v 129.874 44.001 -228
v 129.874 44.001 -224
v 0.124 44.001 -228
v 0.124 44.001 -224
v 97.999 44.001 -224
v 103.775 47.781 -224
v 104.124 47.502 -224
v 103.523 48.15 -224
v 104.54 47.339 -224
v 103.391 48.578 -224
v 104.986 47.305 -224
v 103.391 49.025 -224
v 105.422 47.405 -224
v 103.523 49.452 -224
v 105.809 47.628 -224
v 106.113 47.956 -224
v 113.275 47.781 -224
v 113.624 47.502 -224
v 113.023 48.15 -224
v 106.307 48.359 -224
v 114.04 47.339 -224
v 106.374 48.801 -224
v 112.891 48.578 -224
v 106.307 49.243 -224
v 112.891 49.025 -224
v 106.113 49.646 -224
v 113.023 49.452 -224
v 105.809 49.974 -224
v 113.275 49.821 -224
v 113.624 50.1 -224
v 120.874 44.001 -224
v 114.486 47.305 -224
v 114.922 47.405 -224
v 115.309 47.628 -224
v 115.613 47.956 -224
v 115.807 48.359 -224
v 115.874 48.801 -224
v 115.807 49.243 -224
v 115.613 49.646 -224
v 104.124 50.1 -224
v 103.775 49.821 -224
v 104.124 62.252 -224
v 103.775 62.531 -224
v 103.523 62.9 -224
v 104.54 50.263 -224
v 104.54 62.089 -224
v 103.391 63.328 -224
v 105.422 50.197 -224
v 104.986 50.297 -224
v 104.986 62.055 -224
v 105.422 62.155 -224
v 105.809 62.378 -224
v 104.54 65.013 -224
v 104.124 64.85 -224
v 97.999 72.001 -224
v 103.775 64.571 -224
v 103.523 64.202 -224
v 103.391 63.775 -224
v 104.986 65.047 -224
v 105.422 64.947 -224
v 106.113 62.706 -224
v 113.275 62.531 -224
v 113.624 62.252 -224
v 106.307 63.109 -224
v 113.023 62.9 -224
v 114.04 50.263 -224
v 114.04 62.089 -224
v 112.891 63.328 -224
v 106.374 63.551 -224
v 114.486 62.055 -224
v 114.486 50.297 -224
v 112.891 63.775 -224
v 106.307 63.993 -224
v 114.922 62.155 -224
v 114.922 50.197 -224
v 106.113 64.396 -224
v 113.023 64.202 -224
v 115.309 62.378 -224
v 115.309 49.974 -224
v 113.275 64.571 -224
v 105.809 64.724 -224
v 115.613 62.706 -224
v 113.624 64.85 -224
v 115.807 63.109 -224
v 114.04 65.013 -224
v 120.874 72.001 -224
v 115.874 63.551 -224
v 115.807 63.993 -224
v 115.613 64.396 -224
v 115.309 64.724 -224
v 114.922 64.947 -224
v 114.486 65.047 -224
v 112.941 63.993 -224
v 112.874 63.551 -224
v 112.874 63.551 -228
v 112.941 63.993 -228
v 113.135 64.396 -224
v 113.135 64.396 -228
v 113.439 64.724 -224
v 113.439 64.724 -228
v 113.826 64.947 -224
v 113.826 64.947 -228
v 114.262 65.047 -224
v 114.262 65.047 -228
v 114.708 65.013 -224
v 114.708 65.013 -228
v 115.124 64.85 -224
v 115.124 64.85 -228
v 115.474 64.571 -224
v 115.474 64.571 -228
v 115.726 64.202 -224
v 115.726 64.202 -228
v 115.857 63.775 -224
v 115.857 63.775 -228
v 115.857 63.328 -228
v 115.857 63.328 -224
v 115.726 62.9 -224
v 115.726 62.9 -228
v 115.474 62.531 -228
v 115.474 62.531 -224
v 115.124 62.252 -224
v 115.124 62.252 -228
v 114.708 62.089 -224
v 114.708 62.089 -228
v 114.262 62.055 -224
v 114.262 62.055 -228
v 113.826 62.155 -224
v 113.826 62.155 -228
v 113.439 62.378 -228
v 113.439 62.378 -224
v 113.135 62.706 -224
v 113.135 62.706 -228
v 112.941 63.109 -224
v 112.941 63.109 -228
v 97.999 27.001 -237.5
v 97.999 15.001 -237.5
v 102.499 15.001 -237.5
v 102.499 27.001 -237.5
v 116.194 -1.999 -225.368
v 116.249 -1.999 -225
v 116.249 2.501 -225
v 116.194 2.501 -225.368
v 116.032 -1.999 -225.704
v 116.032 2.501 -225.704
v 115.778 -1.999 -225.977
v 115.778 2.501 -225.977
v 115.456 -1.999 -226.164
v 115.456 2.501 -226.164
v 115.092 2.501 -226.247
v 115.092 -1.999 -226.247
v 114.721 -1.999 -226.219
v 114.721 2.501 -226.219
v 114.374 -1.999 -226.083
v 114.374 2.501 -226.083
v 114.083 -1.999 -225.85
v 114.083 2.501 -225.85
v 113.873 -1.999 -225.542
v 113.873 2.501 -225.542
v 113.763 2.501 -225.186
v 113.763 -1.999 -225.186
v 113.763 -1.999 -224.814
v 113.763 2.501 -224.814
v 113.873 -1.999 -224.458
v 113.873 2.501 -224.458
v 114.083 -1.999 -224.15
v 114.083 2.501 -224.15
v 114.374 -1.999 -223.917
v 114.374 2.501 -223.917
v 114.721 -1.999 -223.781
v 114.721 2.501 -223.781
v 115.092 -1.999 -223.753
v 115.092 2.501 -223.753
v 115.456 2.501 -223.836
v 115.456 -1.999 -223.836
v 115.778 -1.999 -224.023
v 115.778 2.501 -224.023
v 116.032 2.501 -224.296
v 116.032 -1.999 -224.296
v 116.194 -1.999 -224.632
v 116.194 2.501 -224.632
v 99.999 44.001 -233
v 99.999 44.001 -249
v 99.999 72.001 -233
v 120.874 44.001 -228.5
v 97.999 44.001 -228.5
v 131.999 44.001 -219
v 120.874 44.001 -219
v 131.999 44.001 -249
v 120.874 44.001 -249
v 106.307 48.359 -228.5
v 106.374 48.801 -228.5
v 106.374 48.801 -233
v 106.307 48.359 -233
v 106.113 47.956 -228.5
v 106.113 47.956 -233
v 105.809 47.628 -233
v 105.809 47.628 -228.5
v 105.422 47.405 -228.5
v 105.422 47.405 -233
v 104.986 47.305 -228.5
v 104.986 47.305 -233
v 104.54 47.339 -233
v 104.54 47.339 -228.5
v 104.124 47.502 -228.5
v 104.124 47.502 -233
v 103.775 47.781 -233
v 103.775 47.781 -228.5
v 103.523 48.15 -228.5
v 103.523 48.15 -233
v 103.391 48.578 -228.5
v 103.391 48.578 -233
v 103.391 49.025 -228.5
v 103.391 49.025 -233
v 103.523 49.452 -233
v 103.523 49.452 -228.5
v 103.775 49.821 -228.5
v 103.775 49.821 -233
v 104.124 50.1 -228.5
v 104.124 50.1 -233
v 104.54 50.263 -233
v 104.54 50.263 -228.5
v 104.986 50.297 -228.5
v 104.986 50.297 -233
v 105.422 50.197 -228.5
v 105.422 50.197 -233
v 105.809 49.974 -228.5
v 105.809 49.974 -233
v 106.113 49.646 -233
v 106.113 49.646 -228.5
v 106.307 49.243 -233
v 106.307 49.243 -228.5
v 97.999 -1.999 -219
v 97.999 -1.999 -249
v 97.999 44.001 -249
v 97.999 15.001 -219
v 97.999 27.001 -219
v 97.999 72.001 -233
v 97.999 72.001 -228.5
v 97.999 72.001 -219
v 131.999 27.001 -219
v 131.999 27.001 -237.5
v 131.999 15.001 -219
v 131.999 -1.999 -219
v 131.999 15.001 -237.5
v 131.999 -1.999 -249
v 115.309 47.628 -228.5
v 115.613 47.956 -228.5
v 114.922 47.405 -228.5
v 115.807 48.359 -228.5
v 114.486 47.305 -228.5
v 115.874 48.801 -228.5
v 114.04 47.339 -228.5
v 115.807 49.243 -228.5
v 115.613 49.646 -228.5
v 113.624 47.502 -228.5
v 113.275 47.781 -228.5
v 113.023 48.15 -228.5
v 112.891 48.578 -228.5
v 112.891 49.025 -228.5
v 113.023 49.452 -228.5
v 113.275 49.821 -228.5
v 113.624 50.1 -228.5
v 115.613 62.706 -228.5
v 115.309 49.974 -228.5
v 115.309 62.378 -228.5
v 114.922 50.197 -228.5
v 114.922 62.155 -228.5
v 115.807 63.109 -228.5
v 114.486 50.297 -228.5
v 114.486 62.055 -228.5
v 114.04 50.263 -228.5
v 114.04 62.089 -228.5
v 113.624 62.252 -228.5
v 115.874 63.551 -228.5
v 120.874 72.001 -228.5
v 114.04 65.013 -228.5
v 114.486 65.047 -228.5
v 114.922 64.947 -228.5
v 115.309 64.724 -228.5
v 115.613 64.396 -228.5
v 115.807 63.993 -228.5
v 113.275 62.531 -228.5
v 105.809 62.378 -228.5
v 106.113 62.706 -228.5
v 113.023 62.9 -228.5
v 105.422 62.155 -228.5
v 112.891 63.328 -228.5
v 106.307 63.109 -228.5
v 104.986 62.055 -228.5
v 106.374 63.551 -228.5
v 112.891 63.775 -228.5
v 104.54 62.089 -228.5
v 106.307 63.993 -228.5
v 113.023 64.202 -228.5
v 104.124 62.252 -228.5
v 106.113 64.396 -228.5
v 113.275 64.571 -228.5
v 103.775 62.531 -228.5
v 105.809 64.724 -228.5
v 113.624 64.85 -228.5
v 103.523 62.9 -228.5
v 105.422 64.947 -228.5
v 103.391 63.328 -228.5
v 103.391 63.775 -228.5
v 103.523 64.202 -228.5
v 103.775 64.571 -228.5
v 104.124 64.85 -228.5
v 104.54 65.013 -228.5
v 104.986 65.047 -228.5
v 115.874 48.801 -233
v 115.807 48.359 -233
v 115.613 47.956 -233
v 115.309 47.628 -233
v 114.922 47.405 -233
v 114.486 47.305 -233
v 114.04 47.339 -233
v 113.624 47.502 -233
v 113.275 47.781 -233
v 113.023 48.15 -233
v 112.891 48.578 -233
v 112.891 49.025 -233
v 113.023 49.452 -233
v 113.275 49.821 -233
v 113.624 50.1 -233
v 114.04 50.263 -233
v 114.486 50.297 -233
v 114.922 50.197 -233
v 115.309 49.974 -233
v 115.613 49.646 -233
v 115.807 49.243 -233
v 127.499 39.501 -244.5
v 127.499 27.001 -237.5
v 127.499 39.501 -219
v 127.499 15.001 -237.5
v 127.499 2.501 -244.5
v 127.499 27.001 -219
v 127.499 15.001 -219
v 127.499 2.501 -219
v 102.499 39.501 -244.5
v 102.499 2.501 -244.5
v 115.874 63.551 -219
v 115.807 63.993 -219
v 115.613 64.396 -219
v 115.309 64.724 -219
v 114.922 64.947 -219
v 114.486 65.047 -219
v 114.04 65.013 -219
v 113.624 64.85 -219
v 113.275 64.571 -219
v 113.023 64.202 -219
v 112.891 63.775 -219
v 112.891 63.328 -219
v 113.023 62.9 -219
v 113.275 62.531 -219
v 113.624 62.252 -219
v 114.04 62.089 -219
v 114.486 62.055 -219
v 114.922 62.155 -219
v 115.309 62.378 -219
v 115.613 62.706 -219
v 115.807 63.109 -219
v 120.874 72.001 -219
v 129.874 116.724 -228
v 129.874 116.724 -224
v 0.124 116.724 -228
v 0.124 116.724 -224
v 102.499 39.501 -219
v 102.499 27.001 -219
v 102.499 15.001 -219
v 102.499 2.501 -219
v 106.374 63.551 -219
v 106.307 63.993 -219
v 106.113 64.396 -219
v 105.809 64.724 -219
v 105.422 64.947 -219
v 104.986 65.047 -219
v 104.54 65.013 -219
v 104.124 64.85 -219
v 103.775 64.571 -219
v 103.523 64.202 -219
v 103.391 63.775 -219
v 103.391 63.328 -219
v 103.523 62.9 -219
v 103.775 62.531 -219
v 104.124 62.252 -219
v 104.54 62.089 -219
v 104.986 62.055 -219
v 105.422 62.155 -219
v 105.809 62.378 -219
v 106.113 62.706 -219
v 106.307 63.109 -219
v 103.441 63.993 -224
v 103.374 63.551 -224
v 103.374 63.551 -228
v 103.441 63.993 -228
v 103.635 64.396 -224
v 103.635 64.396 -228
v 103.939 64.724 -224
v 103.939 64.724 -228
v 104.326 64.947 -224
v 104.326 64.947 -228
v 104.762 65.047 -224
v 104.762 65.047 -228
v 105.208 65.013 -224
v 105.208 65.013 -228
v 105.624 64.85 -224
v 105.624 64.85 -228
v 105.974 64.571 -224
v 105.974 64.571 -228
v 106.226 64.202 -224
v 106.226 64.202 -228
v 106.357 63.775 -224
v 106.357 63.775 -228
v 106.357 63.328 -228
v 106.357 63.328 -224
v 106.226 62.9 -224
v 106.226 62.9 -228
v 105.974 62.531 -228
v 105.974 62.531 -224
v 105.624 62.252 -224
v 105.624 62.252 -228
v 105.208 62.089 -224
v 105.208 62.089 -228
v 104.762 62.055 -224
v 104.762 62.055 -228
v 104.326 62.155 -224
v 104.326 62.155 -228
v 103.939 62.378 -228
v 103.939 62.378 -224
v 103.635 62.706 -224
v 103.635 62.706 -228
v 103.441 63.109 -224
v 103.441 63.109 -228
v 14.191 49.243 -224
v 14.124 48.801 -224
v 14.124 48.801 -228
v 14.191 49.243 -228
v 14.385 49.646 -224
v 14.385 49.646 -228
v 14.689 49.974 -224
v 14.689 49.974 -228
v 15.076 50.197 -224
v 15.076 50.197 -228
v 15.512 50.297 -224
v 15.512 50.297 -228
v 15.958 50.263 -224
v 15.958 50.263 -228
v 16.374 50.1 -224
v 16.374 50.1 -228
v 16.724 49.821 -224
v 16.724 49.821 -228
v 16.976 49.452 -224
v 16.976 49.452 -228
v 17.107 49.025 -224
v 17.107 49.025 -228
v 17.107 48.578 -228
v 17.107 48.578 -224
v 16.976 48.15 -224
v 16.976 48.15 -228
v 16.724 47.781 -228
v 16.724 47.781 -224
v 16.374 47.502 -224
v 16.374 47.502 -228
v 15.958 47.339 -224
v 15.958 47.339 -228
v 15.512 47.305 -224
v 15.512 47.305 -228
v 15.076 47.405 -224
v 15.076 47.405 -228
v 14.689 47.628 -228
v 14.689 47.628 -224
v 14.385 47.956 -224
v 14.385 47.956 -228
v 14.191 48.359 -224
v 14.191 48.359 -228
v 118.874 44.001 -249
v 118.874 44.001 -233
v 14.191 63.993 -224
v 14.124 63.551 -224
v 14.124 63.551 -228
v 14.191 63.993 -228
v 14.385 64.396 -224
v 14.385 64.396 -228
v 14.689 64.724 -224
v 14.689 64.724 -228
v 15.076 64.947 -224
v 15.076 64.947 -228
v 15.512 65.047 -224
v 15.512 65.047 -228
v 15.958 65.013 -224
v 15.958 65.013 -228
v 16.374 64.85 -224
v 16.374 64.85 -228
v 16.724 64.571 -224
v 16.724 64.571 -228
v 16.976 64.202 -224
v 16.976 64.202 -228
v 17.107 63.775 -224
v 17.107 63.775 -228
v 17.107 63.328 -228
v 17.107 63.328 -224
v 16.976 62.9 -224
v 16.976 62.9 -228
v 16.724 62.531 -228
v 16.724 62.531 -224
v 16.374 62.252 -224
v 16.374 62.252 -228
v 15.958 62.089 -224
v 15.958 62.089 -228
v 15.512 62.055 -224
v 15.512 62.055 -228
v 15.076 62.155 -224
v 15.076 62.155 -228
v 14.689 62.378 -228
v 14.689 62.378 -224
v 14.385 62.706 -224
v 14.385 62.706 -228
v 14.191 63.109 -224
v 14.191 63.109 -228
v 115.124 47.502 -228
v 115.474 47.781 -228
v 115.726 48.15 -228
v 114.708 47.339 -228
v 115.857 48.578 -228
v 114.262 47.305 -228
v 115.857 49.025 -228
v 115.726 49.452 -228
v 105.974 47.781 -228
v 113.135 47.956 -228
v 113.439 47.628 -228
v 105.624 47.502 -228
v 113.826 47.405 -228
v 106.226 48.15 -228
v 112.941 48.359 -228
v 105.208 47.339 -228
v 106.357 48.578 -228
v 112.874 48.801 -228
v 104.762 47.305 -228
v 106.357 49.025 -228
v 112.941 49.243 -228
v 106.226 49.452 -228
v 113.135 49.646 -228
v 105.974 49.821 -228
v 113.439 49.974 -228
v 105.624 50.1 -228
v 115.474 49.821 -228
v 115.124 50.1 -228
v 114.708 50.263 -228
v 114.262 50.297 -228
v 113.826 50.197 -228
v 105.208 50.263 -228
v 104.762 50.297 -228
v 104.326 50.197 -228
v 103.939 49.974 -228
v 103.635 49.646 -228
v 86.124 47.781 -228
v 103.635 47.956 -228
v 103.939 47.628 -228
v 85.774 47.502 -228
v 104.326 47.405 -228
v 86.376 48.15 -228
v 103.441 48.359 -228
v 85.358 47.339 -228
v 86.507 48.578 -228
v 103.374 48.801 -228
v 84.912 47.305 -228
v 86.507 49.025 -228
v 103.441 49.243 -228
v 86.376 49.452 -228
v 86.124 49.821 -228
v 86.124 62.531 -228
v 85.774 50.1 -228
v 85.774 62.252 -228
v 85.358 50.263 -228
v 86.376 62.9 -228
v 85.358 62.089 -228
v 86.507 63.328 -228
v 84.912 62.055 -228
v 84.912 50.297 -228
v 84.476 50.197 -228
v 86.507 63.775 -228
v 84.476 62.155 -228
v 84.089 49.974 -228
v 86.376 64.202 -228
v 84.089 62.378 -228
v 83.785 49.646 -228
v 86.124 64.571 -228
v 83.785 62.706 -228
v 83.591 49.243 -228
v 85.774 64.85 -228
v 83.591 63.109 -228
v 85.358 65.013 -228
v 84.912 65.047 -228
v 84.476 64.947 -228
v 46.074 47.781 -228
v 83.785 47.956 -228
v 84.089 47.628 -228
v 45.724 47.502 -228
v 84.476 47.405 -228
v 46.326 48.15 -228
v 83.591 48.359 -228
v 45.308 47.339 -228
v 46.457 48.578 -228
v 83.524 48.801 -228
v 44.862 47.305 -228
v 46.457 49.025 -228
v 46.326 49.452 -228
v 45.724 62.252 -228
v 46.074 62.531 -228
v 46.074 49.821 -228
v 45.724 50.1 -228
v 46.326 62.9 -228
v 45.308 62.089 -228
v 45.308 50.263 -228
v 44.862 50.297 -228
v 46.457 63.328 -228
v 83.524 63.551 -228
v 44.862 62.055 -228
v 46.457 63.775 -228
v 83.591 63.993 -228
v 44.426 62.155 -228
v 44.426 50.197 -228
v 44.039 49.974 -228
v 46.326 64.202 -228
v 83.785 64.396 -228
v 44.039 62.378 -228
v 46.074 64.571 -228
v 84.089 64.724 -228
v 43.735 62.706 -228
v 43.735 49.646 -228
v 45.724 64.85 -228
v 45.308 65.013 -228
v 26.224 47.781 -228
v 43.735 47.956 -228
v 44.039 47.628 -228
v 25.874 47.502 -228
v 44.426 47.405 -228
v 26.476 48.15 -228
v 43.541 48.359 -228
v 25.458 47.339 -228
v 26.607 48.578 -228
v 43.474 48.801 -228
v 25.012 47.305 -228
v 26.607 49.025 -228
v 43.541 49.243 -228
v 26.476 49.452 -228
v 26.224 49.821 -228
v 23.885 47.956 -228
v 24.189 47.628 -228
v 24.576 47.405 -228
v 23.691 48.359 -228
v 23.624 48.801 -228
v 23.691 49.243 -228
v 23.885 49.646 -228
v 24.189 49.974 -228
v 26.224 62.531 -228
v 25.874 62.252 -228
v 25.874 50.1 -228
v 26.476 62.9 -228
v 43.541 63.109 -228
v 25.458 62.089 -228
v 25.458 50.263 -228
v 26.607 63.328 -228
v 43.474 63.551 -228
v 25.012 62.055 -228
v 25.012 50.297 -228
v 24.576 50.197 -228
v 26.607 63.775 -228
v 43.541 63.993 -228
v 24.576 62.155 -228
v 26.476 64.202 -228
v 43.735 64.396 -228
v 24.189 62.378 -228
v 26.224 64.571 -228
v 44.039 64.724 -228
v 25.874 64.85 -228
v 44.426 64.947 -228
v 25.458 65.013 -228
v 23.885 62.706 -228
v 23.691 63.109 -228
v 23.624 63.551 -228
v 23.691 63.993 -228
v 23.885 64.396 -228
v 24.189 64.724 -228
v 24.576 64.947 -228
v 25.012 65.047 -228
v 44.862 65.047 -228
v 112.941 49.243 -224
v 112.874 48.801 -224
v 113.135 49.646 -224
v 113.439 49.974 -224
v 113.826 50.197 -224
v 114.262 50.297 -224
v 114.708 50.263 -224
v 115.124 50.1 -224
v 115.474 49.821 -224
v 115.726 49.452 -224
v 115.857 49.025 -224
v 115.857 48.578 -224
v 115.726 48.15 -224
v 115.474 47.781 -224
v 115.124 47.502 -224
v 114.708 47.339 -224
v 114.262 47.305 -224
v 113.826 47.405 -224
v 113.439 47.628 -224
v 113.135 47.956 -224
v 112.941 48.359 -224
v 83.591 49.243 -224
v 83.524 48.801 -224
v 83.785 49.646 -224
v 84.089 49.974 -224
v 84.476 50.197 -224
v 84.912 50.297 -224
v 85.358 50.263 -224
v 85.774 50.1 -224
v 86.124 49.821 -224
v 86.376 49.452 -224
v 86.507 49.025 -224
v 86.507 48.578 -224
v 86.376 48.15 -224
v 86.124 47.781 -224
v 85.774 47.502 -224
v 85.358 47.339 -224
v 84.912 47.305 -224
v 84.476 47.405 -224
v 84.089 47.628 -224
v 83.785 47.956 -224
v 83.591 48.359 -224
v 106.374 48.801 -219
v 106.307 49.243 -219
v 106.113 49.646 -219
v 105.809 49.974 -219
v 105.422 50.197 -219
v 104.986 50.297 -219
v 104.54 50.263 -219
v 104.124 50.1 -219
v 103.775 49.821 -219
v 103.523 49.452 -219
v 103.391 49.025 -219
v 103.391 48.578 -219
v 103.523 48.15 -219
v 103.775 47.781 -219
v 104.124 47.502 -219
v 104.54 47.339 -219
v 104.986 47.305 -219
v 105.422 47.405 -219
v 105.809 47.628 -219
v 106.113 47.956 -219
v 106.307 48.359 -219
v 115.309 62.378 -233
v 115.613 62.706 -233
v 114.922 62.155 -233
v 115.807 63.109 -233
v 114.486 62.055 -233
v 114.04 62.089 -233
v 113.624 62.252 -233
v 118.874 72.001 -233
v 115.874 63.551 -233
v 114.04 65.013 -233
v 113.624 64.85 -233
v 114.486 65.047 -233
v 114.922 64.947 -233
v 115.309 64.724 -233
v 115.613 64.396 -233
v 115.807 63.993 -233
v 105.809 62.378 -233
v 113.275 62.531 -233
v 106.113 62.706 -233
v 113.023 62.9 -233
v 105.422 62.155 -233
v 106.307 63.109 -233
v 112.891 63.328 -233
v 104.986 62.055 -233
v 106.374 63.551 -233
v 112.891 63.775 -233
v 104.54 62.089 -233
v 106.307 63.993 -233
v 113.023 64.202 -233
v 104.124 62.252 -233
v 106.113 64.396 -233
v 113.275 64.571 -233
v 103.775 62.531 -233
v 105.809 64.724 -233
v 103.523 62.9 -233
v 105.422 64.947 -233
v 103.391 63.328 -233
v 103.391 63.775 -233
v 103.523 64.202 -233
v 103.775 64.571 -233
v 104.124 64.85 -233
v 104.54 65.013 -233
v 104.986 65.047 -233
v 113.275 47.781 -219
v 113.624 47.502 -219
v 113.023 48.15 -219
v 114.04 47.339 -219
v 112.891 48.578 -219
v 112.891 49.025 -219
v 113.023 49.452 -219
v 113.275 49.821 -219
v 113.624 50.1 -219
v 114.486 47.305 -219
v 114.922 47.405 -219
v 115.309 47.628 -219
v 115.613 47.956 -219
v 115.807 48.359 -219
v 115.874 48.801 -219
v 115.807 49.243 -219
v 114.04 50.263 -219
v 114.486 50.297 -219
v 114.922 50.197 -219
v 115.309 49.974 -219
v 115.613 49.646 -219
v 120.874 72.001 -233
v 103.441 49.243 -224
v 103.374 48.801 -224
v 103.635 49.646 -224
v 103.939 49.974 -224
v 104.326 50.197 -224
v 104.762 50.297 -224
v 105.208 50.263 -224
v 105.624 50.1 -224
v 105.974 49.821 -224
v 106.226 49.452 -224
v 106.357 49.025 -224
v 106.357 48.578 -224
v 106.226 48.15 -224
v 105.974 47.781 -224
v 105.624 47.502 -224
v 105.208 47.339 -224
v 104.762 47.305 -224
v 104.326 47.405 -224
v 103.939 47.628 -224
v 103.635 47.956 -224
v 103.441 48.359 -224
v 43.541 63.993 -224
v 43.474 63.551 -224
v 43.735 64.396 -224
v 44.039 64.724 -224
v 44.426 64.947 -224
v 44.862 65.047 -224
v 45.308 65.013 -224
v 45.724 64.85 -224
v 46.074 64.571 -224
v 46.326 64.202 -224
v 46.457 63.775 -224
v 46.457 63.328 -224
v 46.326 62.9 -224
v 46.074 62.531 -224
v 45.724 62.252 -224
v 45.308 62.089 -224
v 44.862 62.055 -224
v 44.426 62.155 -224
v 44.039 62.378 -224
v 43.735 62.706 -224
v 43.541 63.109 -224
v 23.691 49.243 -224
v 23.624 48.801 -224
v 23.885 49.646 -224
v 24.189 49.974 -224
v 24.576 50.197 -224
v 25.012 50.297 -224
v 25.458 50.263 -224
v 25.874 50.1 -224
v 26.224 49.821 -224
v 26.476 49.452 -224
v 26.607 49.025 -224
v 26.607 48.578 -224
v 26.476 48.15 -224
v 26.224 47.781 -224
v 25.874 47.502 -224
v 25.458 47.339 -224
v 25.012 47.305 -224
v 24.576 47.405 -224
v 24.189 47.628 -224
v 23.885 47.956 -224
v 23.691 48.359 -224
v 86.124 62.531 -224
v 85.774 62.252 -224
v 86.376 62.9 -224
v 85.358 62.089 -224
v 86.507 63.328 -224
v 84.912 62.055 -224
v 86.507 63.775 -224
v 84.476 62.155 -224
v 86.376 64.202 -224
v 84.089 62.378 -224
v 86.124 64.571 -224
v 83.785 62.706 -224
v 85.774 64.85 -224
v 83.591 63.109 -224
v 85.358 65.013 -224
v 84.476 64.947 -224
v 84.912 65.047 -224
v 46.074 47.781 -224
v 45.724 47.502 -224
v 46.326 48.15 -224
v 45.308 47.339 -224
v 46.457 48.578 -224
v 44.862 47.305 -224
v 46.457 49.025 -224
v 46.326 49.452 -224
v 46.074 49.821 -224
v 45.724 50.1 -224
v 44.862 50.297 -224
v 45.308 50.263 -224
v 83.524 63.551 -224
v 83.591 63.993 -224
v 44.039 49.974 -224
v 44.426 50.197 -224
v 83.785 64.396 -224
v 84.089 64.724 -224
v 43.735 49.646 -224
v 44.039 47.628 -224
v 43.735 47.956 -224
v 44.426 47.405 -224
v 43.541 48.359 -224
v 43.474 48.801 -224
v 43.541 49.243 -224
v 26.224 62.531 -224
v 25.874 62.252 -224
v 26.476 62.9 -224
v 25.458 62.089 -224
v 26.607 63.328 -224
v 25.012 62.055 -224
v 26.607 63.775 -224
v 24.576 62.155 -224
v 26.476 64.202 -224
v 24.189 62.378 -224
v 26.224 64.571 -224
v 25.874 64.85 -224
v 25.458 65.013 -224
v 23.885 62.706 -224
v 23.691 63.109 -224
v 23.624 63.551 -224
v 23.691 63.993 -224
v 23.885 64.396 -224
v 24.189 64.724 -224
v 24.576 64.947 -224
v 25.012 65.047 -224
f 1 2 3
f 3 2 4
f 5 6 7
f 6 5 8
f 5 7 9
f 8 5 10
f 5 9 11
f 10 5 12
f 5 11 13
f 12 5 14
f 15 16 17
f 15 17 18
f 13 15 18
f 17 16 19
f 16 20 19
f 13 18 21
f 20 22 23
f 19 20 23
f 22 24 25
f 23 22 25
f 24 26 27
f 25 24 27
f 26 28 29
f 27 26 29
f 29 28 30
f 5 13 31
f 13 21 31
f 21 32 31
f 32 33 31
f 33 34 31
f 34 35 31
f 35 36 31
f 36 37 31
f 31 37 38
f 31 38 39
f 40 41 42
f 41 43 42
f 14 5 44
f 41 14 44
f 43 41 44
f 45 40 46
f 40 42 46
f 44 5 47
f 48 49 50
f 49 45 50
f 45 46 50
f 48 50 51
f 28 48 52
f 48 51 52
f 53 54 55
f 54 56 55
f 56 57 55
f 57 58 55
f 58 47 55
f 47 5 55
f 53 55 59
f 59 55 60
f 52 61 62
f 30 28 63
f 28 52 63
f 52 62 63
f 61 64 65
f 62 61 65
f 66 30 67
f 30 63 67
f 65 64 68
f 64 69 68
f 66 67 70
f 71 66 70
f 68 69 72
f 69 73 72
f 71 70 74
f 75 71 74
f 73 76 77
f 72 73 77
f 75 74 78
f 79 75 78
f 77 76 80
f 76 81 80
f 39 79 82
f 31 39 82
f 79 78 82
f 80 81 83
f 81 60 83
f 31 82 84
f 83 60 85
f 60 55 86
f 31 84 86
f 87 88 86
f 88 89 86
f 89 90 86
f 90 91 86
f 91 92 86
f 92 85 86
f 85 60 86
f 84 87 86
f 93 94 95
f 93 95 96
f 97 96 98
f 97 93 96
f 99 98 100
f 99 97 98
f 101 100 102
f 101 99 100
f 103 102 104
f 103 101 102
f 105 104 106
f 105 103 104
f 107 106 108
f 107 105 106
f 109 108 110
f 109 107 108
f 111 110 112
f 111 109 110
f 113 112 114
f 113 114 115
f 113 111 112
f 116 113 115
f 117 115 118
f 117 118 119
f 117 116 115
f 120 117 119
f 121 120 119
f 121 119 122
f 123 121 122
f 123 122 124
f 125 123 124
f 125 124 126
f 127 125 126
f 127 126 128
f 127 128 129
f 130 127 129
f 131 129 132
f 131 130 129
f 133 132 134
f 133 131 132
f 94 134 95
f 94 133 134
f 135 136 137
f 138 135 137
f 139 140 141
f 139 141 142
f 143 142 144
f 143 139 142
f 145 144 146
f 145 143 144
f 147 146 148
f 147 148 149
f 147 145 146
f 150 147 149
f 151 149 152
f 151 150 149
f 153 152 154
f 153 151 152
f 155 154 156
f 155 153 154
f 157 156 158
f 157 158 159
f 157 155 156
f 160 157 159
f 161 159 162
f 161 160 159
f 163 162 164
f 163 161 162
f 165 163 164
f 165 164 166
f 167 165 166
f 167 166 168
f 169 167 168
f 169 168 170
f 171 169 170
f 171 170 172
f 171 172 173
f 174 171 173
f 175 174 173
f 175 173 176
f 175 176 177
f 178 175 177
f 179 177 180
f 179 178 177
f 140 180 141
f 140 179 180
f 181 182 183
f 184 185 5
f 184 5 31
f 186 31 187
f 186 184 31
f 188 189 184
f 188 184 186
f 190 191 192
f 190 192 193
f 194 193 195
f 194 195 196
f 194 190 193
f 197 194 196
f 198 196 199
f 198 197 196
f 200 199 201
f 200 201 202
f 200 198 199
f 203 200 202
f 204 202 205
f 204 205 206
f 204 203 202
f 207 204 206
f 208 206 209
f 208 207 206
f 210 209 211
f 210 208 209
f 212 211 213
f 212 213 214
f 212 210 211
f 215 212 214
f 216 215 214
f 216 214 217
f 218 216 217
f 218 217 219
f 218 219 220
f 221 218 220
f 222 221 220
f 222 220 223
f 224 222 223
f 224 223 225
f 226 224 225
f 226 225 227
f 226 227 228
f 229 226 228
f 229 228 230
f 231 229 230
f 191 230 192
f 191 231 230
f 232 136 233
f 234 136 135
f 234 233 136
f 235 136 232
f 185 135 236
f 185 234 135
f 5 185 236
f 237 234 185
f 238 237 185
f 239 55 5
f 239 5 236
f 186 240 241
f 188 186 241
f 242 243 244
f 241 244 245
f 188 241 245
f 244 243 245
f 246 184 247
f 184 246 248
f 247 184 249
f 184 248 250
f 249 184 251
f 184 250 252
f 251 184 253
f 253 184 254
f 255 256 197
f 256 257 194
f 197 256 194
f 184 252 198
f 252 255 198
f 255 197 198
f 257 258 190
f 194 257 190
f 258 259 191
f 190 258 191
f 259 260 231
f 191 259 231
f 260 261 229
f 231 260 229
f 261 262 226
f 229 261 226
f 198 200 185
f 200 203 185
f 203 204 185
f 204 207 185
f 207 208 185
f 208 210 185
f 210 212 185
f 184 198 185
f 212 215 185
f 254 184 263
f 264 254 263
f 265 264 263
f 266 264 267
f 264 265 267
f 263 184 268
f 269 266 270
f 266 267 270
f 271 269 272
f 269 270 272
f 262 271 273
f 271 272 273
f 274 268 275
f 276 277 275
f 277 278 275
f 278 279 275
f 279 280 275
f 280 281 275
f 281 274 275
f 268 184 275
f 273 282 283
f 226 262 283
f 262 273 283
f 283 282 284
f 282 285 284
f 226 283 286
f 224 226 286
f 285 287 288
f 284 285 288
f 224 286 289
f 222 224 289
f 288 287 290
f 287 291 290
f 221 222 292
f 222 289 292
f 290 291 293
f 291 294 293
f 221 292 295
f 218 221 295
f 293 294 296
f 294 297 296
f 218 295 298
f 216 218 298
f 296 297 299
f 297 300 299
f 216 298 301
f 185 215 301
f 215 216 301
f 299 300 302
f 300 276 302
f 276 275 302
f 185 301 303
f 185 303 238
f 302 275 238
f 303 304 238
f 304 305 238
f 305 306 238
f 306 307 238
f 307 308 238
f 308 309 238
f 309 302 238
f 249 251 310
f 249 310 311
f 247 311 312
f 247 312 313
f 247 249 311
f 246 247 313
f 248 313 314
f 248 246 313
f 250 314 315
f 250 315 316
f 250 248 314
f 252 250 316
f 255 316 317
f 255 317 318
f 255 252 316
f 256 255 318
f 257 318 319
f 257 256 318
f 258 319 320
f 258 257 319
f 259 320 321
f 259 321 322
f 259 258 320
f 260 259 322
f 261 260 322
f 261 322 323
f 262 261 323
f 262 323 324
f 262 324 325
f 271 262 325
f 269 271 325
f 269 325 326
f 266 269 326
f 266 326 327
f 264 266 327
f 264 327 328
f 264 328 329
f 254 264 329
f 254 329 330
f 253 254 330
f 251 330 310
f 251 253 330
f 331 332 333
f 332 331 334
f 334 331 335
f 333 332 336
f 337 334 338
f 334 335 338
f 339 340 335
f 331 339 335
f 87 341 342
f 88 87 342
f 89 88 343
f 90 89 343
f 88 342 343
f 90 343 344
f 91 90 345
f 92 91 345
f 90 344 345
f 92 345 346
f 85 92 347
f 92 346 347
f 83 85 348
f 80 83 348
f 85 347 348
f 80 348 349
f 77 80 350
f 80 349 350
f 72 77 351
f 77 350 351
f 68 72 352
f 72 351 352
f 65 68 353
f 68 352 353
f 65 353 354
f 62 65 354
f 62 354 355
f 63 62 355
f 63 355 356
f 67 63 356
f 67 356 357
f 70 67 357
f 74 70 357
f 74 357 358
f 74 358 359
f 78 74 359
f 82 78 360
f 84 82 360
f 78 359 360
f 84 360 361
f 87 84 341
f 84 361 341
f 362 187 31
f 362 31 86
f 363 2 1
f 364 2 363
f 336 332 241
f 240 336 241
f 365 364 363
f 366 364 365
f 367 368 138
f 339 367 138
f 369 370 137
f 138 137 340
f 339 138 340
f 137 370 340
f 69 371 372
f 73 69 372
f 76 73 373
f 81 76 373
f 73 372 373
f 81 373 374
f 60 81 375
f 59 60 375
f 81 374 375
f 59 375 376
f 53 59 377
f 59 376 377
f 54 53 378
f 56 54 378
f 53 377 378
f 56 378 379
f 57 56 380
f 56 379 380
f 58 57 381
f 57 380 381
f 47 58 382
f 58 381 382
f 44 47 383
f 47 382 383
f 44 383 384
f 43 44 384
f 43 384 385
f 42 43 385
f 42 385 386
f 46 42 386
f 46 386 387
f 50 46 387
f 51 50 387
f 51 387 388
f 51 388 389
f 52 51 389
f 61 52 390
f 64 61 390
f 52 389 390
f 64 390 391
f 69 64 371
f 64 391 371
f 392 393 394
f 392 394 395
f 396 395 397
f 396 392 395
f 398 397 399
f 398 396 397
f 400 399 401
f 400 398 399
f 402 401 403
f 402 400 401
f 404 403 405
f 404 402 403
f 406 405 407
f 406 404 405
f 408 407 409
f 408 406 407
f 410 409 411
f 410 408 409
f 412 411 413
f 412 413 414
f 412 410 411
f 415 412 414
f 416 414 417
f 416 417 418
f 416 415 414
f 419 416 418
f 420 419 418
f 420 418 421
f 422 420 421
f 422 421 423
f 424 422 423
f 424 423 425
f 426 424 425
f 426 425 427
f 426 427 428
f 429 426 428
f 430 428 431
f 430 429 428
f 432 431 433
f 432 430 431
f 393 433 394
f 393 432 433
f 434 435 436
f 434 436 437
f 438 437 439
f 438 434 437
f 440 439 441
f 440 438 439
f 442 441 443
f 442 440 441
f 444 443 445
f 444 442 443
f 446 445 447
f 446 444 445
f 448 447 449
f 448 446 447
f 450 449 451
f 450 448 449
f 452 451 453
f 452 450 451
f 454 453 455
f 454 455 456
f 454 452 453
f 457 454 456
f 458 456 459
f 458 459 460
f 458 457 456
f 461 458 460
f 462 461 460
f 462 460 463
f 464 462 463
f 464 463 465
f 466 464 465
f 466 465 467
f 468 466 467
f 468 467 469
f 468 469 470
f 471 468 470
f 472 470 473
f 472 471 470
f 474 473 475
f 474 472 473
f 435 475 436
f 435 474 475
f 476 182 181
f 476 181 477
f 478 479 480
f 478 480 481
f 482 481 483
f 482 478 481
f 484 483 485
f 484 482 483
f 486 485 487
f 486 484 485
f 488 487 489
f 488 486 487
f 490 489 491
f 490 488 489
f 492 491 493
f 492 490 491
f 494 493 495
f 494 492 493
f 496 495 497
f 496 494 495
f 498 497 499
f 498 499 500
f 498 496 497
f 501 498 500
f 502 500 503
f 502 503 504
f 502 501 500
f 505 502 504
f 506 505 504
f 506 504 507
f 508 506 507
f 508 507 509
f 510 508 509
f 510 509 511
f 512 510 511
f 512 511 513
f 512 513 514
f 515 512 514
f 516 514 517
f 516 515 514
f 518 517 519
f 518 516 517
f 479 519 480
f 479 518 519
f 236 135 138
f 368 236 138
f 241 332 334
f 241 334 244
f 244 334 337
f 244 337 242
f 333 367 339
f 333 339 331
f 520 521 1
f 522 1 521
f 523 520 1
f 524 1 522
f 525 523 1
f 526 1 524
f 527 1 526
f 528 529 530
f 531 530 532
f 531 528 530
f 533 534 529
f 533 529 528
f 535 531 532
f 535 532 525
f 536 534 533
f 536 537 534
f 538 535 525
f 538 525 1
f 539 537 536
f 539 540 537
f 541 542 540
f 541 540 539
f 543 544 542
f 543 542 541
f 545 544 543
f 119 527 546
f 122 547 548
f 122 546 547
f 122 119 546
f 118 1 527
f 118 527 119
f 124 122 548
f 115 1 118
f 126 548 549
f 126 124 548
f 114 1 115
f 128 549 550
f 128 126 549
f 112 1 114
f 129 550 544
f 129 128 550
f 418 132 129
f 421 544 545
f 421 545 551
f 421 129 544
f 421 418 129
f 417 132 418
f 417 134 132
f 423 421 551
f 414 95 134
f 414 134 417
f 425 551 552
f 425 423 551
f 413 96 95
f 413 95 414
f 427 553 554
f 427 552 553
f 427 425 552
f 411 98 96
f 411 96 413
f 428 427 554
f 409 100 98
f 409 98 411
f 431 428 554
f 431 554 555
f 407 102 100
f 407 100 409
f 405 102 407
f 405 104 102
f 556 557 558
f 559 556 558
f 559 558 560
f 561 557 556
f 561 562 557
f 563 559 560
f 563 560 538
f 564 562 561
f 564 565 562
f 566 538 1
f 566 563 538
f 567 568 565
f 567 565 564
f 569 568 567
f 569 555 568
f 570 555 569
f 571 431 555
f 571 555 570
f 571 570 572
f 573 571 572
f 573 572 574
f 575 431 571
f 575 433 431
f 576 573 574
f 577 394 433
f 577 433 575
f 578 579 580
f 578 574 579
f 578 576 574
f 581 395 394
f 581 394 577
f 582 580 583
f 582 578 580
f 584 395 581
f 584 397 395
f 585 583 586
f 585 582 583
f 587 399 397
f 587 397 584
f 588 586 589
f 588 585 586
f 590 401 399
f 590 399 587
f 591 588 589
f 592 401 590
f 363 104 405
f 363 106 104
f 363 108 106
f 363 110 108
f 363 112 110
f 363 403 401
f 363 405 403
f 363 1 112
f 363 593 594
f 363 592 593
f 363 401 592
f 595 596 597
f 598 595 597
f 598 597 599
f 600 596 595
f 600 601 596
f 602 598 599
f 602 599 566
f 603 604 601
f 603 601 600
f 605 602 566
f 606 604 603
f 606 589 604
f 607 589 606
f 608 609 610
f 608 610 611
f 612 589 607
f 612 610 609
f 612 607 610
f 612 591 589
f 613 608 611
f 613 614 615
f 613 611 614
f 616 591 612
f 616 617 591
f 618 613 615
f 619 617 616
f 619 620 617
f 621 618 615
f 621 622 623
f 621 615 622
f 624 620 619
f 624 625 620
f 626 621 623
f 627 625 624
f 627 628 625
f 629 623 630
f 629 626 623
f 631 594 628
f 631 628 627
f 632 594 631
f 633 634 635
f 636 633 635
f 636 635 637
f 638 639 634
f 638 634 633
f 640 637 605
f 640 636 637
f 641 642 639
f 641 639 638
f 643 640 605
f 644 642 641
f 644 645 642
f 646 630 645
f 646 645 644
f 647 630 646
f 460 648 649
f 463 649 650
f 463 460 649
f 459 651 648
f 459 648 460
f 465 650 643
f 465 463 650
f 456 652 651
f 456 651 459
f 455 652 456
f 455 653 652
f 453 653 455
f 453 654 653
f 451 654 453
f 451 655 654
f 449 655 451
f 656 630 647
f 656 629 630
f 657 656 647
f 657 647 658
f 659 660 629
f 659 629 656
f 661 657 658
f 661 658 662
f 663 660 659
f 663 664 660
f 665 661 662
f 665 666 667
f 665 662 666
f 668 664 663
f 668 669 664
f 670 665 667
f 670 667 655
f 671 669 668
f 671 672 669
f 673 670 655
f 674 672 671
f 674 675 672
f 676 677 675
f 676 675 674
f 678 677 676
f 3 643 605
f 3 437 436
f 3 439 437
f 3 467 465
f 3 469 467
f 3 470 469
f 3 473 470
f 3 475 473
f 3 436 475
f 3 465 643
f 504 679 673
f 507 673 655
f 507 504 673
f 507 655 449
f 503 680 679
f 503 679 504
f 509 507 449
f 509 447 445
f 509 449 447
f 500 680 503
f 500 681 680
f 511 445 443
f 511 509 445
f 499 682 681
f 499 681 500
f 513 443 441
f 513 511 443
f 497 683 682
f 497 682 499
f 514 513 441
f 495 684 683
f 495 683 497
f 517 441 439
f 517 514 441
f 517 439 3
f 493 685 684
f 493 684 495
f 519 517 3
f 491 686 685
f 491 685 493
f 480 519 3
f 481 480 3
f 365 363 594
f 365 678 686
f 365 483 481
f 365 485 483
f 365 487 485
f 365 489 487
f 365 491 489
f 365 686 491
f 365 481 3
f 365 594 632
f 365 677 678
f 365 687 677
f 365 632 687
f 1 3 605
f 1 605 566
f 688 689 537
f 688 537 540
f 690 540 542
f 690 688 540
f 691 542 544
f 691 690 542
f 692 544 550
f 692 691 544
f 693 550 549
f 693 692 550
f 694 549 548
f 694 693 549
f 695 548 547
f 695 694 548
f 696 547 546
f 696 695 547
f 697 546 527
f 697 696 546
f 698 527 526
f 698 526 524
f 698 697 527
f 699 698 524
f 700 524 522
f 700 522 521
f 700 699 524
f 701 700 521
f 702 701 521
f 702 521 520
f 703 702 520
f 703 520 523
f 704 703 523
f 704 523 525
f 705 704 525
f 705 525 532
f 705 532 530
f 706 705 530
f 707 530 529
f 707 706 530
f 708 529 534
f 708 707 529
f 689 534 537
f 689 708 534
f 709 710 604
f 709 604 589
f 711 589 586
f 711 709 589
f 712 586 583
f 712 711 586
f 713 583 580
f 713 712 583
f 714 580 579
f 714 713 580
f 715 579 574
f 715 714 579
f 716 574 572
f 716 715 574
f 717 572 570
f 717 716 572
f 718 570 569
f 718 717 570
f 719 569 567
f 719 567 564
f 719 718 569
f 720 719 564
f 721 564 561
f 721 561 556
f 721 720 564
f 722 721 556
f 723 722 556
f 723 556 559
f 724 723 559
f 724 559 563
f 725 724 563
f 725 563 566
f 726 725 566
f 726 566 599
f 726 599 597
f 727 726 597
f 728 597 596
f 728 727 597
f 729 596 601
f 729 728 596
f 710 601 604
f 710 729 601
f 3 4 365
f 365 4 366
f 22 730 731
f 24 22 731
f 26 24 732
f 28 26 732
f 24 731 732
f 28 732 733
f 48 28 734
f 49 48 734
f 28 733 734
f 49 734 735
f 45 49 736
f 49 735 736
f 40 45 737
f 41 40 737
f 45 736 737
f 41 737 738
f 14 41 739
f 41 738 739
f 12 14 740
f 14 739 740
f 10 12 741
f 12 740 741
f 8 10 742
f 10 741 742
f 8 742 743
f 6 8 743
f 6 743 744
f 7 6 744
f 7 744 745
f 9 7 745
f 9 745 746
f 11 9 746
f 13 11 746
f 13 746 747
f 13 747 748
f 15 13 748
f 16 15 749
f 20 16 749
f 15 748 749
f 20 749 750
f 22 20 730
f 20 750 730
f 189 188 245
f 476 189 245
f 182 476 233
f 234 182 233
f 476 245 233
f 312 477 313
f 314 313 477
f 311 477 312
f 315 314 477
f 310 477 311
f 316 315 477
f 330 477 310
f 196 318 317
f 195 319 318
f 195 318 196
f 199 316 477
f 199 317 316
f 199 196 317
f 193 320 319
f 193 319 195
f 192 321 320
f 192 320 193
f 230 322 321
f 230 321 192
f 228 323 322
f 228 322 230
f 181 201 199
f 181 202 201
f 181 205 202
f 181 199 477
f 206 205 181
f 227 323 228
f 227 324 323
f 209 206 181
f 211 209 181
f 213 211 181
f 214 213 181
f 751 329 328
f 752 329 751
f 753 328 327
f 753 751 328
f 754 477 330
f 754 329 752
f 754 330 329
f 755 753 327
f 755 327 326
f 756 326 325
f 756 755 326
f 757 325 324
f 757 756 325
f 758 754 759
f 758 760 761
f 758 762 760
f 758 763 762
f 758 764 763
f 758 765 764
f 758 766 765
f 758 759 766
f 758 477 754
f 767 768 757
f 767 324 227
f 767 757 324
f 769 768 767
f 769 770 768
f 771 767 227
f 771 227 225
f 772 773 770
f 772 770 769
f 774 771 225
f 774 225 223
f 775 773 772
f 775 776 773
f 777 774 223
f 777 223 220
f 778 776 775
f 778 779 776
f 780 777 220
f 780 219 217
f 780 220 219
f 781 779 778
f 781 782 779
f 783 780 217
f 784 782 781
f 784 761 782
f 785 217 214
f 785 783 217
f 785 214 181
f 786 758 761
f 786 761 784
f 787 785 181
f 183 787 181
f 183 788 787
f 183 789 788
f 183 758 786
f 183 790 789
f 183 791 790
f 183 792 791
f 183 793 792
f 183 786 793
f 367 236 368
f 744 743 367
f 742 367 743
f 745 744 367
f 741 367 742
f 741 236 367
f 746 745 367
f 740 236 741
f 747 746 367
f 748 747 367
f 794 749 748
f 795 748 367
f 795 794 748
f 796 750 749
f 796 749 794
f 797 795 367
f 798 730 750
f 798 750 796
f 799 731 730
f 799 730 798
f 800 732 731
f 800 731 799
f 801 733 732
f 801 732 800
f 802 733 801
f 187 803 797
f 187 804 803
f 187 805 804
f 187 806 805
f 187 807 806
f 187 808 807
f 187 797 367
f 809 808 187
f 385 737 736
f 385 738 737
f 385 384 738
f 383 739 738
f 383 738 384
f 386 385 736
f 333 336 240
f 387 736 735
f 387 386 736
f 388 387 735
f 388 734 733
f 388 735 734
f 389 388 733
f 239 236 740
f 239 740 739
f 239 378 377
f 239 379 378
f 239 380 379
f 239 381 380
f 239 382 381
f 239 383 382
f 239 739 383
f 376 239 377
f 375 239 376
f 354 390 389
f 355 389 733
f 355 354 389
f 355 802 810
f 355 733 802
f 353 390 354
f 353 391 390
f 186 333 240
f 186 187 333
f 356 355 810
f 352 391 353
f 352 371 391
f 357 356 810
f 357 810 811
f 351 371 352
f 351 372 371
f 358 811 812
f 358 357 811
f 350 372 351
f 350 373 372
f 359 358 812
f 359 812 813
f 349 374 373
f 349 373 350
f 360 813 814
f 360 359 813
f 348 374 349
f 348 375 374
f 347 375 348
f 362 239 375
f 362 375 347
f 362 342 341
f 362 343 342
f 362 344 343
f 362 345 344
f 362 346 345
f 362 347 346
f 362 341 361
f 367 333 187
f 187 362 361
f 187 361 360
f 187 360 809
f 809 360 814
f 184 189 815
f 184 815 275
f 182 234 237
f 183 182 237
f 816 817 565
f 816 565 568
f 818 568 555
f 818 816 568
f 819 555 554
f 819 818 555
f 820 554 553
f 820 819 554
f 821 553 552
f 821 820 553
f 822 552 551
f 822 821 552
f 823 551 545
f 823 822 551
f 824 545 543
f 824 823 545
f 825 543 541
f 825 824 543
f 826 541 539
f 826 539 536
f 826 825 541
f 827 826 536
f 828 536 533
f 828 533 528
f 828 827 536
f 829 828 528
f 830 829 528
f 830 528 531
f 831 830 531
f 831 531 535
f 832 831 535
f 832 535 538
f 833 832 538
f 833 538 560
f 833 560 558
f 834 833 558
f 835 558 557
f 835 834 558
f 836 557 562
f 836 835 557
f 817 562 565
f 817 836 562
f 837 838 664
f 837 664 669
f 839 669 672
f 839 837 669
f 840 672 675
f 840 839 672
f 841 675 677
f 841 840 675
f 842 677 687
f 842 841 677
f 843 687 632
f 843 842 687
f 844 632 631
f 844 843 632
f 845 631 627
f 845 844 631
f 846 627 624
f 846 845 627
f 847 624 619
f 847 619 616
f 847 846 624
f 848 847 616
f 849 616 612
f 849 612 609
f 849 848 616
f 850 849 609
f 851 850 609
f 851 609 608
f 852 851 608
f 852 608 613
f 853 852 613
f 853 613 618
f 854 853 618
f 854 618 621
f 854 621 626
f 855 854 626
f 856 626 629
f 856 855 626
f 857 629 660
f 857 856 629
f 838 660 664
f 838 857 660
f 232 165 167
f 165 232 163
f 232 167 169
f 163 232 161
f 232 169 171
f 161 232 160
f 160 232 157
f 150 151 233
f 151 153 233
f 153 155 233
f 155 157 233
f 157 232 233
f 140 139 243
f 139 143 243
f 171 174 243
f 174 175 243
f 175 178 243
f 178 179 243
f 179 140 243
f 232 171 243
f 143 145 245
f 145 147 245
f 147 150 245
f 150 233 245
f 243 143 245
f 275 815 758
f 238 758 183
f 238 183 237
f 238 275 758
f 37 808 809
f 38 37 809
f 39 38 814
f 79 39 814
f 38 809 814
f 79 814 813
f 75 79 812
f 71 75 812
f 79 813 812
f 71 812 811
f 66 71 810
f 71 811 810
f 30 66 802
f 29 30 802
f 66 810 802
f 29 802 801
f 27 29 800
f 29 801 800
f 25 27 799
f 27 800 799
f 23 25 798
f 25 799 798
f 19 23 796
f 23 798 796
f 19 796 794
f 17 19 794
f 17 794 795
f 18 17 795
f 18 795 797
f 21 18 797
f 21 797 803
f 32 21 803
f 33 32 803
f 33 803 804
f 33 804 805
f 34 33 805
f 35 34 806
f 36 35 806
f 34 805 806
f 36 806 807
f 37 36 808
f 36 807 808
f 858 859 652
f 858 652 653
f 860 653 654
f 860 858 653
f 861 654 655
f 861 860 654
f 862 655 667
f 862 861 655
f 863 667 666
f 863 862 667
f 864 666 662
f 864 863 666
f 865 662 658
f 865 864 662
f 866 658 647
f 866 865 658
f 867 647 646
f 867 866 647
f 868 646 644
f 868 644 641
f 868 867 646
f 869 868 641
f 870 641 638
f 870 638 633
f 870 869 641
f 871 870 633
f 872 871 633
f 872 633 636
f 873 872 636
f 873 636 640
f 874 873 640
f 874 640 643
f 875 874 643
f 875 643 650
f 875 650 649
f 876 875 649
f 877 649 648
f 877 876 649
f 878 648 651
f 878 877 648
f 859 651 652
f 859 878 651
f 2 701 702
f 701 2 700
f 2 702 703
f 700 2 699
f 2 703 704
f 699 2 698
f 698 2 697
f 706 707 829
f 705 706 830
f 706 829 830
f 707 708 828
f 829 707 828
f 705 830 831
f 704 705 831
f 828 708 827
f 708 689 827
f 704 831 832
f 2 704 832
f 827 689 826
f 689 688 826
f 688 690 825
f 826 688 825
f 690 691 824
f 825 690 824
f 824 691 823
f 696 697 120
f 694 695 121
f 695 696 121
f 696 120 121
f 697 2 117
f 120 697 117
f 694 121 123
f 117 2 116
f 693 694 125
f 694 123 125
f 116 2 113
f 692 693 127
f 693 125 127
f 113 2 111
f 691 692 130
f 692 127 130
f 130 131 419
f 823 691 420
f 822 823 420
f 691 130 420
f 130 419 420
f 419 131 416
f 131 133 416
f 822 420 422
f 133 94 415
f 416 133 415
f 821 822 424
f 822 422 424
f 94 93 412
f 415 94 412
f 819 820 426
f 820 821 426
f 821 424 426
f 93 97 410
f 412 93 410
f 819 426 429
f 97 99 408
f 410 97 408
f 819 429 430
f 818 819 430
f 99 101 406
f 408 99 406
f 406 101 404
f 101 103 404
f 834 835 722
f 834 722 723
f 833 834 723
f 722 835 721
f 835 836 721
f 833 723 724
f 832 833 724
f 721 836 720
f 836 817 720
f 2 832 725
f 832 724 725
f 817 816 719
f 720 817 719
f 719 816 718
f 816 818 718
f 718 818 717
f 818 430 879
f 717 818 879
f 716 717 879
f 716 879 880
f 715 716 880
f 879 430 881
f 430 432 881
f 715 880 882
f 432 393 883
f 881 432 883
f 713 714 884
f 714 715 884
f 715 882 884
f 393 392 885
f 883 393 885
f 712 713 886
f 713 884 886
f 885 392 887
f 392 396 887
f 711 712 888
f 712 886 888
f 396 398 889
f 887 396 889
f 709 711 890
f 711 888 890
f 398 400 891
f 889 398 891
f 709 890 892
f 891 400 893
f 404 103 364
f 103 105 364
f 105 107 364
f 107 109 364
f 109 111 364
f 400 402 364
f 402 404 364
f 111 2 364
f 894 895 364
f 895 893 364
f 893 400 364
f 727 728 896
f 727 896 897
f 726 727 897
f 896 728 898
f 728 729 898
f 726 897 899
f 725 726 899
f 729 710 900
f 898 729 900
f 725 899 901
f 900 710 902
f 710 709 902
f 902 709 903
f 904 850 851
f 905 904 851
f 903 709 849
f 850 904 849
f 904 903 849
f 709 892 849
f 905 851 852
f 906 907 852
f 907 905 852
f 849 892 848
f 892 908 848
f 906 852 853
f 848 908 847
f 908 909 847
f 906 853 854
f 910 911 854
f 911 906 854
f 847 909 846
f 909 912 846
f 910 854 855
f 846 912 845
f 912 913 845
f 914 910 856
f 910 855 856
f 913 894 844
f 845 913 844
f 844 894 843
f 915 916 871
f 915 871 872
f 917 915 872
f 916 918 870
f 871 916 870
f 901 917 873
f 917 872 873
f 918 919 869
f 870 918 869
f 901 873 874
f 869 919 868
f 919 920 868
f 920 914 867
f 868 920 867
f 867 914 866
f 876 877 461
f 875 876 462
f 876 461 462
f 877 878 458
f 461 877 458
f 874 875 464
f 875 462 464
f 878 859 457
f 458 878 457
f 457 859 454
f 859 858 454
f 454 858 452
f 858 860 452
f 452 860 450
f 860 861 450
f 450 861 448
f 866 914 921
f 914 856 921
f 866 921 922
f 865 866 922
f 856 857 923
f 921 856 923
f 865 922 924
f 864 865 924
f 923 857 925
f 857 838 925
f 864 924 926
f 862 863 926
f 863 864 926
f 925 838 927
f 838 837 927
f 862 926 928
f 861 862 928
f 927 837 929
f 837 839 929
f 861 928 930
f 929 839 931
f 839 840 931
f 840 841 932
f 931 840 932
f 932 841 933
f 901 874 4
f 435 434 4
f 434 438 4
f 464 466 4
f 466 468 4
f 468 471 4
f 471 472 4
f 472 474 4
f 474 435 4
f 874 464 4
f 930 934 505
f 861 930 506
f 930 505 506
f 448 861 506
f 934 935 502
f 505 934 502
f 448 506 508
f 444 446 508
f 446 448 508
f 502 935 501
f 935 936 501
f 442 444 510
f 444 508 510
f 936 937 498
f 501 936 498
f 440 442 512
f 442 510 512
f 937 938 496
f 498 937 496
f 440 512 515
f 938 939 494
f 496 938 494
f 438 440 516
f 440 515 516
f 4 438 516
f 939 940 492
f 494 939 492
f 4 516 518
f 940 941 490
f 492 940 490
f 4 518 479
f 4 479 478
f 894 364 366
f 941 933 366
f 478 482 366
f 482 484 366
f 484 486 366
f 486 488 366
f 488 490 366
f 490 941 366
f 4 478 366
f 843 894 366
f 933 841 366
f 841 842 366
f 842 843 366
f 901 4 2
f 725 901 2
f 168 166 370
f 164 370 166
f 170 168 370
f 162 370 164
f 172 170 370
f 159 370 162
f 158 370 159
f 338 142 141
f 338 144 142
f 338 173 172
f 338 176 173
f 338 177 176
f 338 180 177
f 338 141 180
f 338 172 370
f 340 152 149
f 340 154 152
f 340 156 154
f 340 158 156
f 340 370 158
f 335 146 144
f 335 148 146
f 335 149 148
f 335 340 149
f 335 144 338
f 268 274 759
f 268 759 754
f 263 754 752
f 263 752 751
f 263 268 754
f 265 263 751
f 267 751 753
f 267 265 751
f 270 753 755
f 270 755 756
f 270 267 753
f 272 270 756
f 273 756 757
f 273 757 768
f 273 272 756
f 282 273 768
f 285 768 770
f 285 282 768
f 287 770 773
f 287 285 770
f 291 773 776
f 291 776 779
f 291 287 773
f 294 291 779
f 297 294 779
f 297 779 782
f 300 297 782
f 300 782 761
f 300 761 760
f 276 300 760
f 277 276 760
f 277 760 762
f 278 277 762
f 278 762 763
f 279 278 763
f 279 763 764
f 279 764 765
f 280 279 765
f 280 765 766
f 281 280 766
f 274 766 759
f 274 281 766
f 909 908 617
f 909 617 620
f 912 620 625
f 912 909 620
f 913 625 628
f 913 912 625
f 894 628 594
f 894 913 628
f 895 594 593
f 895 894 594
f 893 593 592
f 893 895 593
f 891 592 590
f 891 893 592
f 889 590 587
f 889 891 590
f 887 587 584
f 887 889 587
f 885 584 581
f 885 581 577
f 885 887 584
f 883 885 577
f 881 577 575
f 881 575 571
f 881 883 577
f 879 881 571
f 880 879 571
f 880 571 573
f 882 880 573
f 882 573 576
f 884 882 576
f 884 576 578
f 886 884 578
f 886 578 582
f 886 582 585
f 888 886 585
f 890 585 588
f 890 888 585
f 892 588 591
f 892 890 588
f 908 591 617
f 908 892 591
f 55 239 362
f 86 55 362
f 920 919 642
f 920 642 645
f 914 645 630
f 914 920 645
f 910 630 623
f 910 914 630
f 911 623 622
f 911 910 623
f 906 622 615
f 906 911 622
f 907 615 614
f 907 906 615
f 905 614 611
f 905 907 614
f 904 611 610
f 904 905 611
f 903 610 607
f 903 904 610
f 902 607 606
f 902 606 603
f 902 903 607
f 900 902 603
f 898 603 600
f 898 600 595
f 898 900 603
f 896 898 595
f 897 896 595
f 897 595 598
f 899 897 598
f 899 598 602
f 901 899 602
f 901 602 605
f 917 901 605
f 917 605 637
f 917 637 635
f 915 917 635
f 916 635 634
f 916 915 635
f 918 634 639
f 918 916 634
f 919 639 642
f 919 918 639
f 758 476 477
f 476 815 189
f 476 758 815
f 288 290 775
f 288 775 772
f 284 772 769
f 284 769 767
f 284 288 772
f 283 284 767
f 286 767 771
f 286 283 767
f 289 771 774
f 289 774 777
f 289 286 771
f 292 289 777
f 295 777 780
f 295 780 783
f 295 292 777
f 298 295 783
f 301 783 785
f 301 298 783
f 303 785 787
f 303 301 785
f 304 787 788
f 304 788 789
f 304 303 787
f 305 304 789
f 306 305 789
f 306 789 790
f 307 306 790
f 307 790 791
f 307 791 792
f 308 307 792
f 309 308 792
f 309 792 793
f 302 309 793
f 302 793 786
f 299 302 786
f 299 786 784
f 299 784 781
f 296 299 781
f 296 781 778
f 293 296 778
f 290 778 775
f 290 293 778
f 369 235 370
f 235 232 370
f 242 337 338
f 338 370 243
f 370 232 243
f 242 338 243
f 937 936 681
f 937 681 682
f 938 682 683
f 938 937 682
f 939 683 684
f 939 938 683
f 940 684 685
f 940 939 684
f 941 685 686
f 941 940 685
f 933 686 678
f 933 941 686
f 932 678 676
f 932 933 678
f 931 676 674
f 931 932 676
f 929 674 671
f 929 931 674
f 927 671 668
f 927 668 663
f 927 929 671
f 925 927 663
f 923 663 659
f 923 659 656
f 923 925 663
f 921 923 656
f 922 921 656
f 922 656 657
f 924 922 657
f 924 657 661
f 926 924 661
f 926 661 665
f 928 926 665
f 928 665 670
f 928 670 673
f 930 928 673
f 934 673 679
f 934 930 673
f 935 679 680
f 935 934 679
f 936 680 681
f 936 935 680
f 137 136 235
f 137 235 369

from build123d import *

# Parameters (mm, degrees)
BOSS_EXTRUDE1_START     = -4
BOSS_EXTRUDE1_OUTLINE_W = 129.75
BOSS_EXTRUDE1_OUTLINE_H = 72.722660418
BOSS_EXTRUDE1_OUTLINE_R = 1.5
BOSS_EXTRUDE1_DEPTH     = 4
THICKEN1_START          = -1.998922973
THICKEN1_DEPTH          = 46
THICKEN1_START_2        = 39.501077027
THICKEN1_2_DEPTH        = 4.5
THICKEN1_3_OUTLINE_R    = 1.25
THICKEN1_3_DEPTH        = 4.5
THICKEN1_START_3        = 2.501077027
THICKEN1_4_OUTLINE_W    = 4.5
THICKEN1_4_OUTLINE_H    = 18.5
THICKEN1_4_DEPTH        = 12.5
THICKEN1_START_4        = 27.001077027
THICKEN1_5_OUTLINE_W    = 4.5
THICKEN1_5_OUTLINE_H    = 18.5
THICKEN1_5_DEPTH        = 12.5
BOSS_EXTRUDE2_START     = 5
SKETCH5_W               = 22.875
SKETCH5_H               = 28
SKETCH5_R               = 1.5
BOSS_EXTRUDE2_DEPTH     = 5
SKETCH6_W               = 22.875
SKETCH6_H               = 28
SKETCH6_R               = 1.5
BOSS_EXTRUDE3_DEPTH     = 4.5
THICKEN2_T2             = 2
THICKEN3_T2             = 2


# Read off the part's stored shape, not the designer's step: Boss-Extrude1, Thicken1
with BuildPart() as part:
    # Boss-Extrude1 outline → Boss-Extrude1 (new body)
    with BuildSketch(Plane(origin=(0, 0, -228), x_dir=(-1, 0, 0), z_dir=(0, 0, -1)).offset(BOSS_EXTRUDE1_START)):
        with Locations((-64.999085346, 80.362407236)):
            Rectangle(BOSS_EXTRUDE1_OUTLINE_W, BOSS_EXTRUDE1_OUTLINE_H)
        with Locations((-114.374085346, 48.801077027)):
            Circle(BOSS_EXTRUDE1_OUTLINE_R, mode=Mode.SUBTRACT)
        with Locations((-104.874085346, 48.801077027)):
            Circle(BOSS_EXTRUDE1_OUTLINE_R, mode=Mode.SUBTRACT)
        with Locations((-85.024085346, 48.801077027)):
            Circle(BOSS_EXTRUDE1_OUTLINE_R, mode=Mode.SUBTRACT)
        with Locations((-114.374085346, 63.551077027)):
            Circle(BOSS_EXTRUDE1_OUTLINE_R, mode=Mode.SUBTRACT)
        with Locations((-104.874085346, 63.551077027)):
            Circle(BOSS_EXTRUDE1_OUTLINE_R, mode=Mode.SUBTRACT)
        with Locations((-85.024085346, 63.551077027)):
            Circle(BOSS_EXTRUDE1_OUTLINE_R, mode=Mode.SUBTRACT)
        with Locations((-44.974085346, 48.801077027)):
            Circle(BOSS_EXTRUDE1_OUTLINE_R, mode=Mode.SUBTRACT)
        with Locations((-25.124085346, 48.801077027)):
            Circle(BOSS_EXTRUDE1_OUTLINE_R, mode=Mode.SUBTRACT)
        with Locations((-15.624085346, 48.801077027)):
            Circle(BOSS_EXTRUDE1_OUTLINE_R, mode=Mode.SUBTRACT)
        with Locations((-44.974085346, 63.551077027)):
            Circle(BOSS_EXTRUDE1_OUTLINE_R, mode=Mode.SUBTRACT)
        with Locations((-25.124085346, 63.551077027)):
            Circle(BOSS_EXTRUDE1_OUTLINE_R, mode=Mode.SUBTRACT)
        with Locations((-15.624085346, 63.551077027)):
            Circle(BOSS_EXTRUDE1_OUTLINE_R, mode=Mode.SUBTRACT)
    extrude(amount=BOSS_EXTRUDE1_DEPTH)


with BuildPart() as body_2:
    # Thicken1 outline → Thicken1 (new body)
    with BuildSketch(Plane(origin=(0, 0, 0), x_dir=(1, 0, 0), z_dir=(0, 1, 0)).offset(THICKEN1_START)):
        Polygon((97.999085346, 237.5), (102.499085346, 237.5), (102.499085346, 244.5), (127.499085346, 244.5), (127.499085346, 237.5), (131.999085346, 237.5), (131.999085346, 249), (97.999085346, 249), align=None)
    extrude(amount=THICKEN1_DEPTH)

    # Thicken1 2 outline → Thicken1 2 (add)
    with BuildSketch(Plane(origin=(0, 0, 0), x_dir=(1, 0, 0), z_dir=(0, 1, 0)).offset(THICKEN1_START_2)):
        Polygon((97.999085346, 219), (131.999085346, 219), (131.999085346, 237.5), (127.499085346, 237.5), (127.499085346, 244.5), (102.499085346, 244.5), (102.499085346, 237.5), (97.999085346, 237.5), align=None)
    extrude(amount=THICKEN1_2_DEPTH)

    # Thicken1 3 outline → Thicken1 3 (add)
    with BuildSketch(Plane(origin=(0, 0, 0), x_dir=(1, 0, 0), z_dir=(0, 1, 0)).offset(THICKEN1_START)):
        Polygon((97.999085346, 219), (131.999085346, 219), (131.999085346, 237.5), (127.499085346, 237.5), (127.499085346, 244.5), (102.499085346, 244.5), (102.499085346, 237.5), (97.999085346, 237.5), align=None)
        with Locations((114.999085346, 225)):
            Circle(THICKEN1_3_OUTLINE_R, mode=Mode.SUBTRACT)
    extrude(amount=THICKEN1_3_DEPTH)

    # Thicken1 4 outline → Thicken1 4 (add)
    with BuildSketch(Plane(origin=(0, 0, 0), x_dir=(1, 0, 0), z_dir=(0, 1, 0)).offset(THICKEN1_START_3)):
        with Locations((100.249085346, 228.25)):
            Rectangle(THICKEN1_4_OUTLINE_W, THICKEN1_4_OUTLINE_H)
        with Locations((129.749085346, 228.25)):
            Rectangle(THICKEN1_4_OUTLINE_W, THICKEN1_4_OUTLINE_H)
    extrude(amount=THICKEN1_4_DEPTH)

    # Thicken1 5 outline → Thicken1 5 (add)
    with BuildSketch(Plane(origin=(0, 0, 0), x_dir=(1, 0, 0), z_dir=(0, 1, 0)).offset(THICKEN1_START_4)):
        with Locations((100.249085346, 228.25)):
            Rectangle(THICKEN1_5_OUTLINE_W, THICKEN1_5_OUTLINE_H)
        with Locations((129.749085346, 228.25)):
            Rectangle(THICKEN1_5_OUTLINE_W, THICKEN1_5_OUTLINE_H)
    extrude(amount=THICKEN1_5_DEPTH)

    # Sketch5 → Boss-Extrude2 (add)
    with BuildSketch(Plane.XY.offset(-224).offset(BOSS_EXTRUDE2_START)):
        with Locations((109.436585346, 58.001077027)):
            Rectangle(SKETCH5_W, SKETCH5_H)
        with Locations((114.374085346, 48.801077027)):
            Circle(SKETCH5_R, mode=Mode.SUBTRACT)
        with Locations((104.874085346, 48.801077027)):
            Circle(SKETCH5_R, mode=Mode.SUBTRACT)
        with Locations((104.874085346, 63.551077027)):
            Circle(SKETCH5_R, mode=Mode.SUBTRACT)
        with Locations((114.374085346, 63.551077027)):
            Circle(SKETCH5_R, mode=Mode.SUBTRACT)
    extrude(amount=-BOSS_EXTRUDE2_DEPTH)

    # Sketch6 → Boss-Extrude3 (add)
    with BuildSketch(Plane(origin=(0, 0, -228.5), x_dir=(-1, 0, 0), z_dir=(0, 0, -1))):
        with Locations((-109.436585346, 58.001077027)):
            Rectangle(SKETCH6_W, SKETCH6_H)
        with Locations(Location((-114.374085346, 48.801077027, 0), (0, 0, 180))):
            Circle(SKETCH6_R, mode=Mode.SUBTRACT)
        with Locations(Location((-104.874085346, 48.801077027, 0), (0, 0, 180))):
            Circle(SKETCH6_R, mode=Mode.SUBTRACT)
        with Locations(Location((-104.874085346, 63.551077027, 0), (0, 0, 180))):
            Circle(SKETCH6_R, mode=Mode.SUBTRACT)
        with Locations(Location((-114.374085346, 63.551077027, 0), (0, 0, 180))):
            Circle(SKETCH6_R, mode=Mode.SUBTRACT)
    extrude(amount=BOSS_EXTRUDE3_DEPTH)

    # Sketch8 → Surface-Plane5: a flat surface bounded by the sketch
    with BuildSketch(Plane(origin=(120.874085346, 0, 0), x_dir=(0, 0, -1), z_dir=(1, 0, 0)), mode=Mode.PRIVATE) as surface_plane5_1_region:
        Polygon((233, 72.001077027), (249, 44.001077027), (233, 44.001077027), align=None)
    surface_plane5_1 = surface_plane5_1_region.sketch.faces()[0]
    add(Solid.thicken(surface_plane5_1, -THICKEN2_T2))

    # Sketch9 → Surface-Plane6: a flat surface bounded by the sketch
    with BuildSketch(Plane.ZY.offset(-97.999085346), mode=Mode.PRIVATE) as surface_plane6_2_region:
        Polygon((-249, 44.001077027), (-233, 44.001077027), (-233, 72.001077027), align=None)
    surface_plane6_2 = surface_plane6_2_region.sketch.faces()[0]
    add(Solid.thicken(surface_plane6_2, -THICKEN3_T2))


solid = Compound([part.part, body_2.part])
